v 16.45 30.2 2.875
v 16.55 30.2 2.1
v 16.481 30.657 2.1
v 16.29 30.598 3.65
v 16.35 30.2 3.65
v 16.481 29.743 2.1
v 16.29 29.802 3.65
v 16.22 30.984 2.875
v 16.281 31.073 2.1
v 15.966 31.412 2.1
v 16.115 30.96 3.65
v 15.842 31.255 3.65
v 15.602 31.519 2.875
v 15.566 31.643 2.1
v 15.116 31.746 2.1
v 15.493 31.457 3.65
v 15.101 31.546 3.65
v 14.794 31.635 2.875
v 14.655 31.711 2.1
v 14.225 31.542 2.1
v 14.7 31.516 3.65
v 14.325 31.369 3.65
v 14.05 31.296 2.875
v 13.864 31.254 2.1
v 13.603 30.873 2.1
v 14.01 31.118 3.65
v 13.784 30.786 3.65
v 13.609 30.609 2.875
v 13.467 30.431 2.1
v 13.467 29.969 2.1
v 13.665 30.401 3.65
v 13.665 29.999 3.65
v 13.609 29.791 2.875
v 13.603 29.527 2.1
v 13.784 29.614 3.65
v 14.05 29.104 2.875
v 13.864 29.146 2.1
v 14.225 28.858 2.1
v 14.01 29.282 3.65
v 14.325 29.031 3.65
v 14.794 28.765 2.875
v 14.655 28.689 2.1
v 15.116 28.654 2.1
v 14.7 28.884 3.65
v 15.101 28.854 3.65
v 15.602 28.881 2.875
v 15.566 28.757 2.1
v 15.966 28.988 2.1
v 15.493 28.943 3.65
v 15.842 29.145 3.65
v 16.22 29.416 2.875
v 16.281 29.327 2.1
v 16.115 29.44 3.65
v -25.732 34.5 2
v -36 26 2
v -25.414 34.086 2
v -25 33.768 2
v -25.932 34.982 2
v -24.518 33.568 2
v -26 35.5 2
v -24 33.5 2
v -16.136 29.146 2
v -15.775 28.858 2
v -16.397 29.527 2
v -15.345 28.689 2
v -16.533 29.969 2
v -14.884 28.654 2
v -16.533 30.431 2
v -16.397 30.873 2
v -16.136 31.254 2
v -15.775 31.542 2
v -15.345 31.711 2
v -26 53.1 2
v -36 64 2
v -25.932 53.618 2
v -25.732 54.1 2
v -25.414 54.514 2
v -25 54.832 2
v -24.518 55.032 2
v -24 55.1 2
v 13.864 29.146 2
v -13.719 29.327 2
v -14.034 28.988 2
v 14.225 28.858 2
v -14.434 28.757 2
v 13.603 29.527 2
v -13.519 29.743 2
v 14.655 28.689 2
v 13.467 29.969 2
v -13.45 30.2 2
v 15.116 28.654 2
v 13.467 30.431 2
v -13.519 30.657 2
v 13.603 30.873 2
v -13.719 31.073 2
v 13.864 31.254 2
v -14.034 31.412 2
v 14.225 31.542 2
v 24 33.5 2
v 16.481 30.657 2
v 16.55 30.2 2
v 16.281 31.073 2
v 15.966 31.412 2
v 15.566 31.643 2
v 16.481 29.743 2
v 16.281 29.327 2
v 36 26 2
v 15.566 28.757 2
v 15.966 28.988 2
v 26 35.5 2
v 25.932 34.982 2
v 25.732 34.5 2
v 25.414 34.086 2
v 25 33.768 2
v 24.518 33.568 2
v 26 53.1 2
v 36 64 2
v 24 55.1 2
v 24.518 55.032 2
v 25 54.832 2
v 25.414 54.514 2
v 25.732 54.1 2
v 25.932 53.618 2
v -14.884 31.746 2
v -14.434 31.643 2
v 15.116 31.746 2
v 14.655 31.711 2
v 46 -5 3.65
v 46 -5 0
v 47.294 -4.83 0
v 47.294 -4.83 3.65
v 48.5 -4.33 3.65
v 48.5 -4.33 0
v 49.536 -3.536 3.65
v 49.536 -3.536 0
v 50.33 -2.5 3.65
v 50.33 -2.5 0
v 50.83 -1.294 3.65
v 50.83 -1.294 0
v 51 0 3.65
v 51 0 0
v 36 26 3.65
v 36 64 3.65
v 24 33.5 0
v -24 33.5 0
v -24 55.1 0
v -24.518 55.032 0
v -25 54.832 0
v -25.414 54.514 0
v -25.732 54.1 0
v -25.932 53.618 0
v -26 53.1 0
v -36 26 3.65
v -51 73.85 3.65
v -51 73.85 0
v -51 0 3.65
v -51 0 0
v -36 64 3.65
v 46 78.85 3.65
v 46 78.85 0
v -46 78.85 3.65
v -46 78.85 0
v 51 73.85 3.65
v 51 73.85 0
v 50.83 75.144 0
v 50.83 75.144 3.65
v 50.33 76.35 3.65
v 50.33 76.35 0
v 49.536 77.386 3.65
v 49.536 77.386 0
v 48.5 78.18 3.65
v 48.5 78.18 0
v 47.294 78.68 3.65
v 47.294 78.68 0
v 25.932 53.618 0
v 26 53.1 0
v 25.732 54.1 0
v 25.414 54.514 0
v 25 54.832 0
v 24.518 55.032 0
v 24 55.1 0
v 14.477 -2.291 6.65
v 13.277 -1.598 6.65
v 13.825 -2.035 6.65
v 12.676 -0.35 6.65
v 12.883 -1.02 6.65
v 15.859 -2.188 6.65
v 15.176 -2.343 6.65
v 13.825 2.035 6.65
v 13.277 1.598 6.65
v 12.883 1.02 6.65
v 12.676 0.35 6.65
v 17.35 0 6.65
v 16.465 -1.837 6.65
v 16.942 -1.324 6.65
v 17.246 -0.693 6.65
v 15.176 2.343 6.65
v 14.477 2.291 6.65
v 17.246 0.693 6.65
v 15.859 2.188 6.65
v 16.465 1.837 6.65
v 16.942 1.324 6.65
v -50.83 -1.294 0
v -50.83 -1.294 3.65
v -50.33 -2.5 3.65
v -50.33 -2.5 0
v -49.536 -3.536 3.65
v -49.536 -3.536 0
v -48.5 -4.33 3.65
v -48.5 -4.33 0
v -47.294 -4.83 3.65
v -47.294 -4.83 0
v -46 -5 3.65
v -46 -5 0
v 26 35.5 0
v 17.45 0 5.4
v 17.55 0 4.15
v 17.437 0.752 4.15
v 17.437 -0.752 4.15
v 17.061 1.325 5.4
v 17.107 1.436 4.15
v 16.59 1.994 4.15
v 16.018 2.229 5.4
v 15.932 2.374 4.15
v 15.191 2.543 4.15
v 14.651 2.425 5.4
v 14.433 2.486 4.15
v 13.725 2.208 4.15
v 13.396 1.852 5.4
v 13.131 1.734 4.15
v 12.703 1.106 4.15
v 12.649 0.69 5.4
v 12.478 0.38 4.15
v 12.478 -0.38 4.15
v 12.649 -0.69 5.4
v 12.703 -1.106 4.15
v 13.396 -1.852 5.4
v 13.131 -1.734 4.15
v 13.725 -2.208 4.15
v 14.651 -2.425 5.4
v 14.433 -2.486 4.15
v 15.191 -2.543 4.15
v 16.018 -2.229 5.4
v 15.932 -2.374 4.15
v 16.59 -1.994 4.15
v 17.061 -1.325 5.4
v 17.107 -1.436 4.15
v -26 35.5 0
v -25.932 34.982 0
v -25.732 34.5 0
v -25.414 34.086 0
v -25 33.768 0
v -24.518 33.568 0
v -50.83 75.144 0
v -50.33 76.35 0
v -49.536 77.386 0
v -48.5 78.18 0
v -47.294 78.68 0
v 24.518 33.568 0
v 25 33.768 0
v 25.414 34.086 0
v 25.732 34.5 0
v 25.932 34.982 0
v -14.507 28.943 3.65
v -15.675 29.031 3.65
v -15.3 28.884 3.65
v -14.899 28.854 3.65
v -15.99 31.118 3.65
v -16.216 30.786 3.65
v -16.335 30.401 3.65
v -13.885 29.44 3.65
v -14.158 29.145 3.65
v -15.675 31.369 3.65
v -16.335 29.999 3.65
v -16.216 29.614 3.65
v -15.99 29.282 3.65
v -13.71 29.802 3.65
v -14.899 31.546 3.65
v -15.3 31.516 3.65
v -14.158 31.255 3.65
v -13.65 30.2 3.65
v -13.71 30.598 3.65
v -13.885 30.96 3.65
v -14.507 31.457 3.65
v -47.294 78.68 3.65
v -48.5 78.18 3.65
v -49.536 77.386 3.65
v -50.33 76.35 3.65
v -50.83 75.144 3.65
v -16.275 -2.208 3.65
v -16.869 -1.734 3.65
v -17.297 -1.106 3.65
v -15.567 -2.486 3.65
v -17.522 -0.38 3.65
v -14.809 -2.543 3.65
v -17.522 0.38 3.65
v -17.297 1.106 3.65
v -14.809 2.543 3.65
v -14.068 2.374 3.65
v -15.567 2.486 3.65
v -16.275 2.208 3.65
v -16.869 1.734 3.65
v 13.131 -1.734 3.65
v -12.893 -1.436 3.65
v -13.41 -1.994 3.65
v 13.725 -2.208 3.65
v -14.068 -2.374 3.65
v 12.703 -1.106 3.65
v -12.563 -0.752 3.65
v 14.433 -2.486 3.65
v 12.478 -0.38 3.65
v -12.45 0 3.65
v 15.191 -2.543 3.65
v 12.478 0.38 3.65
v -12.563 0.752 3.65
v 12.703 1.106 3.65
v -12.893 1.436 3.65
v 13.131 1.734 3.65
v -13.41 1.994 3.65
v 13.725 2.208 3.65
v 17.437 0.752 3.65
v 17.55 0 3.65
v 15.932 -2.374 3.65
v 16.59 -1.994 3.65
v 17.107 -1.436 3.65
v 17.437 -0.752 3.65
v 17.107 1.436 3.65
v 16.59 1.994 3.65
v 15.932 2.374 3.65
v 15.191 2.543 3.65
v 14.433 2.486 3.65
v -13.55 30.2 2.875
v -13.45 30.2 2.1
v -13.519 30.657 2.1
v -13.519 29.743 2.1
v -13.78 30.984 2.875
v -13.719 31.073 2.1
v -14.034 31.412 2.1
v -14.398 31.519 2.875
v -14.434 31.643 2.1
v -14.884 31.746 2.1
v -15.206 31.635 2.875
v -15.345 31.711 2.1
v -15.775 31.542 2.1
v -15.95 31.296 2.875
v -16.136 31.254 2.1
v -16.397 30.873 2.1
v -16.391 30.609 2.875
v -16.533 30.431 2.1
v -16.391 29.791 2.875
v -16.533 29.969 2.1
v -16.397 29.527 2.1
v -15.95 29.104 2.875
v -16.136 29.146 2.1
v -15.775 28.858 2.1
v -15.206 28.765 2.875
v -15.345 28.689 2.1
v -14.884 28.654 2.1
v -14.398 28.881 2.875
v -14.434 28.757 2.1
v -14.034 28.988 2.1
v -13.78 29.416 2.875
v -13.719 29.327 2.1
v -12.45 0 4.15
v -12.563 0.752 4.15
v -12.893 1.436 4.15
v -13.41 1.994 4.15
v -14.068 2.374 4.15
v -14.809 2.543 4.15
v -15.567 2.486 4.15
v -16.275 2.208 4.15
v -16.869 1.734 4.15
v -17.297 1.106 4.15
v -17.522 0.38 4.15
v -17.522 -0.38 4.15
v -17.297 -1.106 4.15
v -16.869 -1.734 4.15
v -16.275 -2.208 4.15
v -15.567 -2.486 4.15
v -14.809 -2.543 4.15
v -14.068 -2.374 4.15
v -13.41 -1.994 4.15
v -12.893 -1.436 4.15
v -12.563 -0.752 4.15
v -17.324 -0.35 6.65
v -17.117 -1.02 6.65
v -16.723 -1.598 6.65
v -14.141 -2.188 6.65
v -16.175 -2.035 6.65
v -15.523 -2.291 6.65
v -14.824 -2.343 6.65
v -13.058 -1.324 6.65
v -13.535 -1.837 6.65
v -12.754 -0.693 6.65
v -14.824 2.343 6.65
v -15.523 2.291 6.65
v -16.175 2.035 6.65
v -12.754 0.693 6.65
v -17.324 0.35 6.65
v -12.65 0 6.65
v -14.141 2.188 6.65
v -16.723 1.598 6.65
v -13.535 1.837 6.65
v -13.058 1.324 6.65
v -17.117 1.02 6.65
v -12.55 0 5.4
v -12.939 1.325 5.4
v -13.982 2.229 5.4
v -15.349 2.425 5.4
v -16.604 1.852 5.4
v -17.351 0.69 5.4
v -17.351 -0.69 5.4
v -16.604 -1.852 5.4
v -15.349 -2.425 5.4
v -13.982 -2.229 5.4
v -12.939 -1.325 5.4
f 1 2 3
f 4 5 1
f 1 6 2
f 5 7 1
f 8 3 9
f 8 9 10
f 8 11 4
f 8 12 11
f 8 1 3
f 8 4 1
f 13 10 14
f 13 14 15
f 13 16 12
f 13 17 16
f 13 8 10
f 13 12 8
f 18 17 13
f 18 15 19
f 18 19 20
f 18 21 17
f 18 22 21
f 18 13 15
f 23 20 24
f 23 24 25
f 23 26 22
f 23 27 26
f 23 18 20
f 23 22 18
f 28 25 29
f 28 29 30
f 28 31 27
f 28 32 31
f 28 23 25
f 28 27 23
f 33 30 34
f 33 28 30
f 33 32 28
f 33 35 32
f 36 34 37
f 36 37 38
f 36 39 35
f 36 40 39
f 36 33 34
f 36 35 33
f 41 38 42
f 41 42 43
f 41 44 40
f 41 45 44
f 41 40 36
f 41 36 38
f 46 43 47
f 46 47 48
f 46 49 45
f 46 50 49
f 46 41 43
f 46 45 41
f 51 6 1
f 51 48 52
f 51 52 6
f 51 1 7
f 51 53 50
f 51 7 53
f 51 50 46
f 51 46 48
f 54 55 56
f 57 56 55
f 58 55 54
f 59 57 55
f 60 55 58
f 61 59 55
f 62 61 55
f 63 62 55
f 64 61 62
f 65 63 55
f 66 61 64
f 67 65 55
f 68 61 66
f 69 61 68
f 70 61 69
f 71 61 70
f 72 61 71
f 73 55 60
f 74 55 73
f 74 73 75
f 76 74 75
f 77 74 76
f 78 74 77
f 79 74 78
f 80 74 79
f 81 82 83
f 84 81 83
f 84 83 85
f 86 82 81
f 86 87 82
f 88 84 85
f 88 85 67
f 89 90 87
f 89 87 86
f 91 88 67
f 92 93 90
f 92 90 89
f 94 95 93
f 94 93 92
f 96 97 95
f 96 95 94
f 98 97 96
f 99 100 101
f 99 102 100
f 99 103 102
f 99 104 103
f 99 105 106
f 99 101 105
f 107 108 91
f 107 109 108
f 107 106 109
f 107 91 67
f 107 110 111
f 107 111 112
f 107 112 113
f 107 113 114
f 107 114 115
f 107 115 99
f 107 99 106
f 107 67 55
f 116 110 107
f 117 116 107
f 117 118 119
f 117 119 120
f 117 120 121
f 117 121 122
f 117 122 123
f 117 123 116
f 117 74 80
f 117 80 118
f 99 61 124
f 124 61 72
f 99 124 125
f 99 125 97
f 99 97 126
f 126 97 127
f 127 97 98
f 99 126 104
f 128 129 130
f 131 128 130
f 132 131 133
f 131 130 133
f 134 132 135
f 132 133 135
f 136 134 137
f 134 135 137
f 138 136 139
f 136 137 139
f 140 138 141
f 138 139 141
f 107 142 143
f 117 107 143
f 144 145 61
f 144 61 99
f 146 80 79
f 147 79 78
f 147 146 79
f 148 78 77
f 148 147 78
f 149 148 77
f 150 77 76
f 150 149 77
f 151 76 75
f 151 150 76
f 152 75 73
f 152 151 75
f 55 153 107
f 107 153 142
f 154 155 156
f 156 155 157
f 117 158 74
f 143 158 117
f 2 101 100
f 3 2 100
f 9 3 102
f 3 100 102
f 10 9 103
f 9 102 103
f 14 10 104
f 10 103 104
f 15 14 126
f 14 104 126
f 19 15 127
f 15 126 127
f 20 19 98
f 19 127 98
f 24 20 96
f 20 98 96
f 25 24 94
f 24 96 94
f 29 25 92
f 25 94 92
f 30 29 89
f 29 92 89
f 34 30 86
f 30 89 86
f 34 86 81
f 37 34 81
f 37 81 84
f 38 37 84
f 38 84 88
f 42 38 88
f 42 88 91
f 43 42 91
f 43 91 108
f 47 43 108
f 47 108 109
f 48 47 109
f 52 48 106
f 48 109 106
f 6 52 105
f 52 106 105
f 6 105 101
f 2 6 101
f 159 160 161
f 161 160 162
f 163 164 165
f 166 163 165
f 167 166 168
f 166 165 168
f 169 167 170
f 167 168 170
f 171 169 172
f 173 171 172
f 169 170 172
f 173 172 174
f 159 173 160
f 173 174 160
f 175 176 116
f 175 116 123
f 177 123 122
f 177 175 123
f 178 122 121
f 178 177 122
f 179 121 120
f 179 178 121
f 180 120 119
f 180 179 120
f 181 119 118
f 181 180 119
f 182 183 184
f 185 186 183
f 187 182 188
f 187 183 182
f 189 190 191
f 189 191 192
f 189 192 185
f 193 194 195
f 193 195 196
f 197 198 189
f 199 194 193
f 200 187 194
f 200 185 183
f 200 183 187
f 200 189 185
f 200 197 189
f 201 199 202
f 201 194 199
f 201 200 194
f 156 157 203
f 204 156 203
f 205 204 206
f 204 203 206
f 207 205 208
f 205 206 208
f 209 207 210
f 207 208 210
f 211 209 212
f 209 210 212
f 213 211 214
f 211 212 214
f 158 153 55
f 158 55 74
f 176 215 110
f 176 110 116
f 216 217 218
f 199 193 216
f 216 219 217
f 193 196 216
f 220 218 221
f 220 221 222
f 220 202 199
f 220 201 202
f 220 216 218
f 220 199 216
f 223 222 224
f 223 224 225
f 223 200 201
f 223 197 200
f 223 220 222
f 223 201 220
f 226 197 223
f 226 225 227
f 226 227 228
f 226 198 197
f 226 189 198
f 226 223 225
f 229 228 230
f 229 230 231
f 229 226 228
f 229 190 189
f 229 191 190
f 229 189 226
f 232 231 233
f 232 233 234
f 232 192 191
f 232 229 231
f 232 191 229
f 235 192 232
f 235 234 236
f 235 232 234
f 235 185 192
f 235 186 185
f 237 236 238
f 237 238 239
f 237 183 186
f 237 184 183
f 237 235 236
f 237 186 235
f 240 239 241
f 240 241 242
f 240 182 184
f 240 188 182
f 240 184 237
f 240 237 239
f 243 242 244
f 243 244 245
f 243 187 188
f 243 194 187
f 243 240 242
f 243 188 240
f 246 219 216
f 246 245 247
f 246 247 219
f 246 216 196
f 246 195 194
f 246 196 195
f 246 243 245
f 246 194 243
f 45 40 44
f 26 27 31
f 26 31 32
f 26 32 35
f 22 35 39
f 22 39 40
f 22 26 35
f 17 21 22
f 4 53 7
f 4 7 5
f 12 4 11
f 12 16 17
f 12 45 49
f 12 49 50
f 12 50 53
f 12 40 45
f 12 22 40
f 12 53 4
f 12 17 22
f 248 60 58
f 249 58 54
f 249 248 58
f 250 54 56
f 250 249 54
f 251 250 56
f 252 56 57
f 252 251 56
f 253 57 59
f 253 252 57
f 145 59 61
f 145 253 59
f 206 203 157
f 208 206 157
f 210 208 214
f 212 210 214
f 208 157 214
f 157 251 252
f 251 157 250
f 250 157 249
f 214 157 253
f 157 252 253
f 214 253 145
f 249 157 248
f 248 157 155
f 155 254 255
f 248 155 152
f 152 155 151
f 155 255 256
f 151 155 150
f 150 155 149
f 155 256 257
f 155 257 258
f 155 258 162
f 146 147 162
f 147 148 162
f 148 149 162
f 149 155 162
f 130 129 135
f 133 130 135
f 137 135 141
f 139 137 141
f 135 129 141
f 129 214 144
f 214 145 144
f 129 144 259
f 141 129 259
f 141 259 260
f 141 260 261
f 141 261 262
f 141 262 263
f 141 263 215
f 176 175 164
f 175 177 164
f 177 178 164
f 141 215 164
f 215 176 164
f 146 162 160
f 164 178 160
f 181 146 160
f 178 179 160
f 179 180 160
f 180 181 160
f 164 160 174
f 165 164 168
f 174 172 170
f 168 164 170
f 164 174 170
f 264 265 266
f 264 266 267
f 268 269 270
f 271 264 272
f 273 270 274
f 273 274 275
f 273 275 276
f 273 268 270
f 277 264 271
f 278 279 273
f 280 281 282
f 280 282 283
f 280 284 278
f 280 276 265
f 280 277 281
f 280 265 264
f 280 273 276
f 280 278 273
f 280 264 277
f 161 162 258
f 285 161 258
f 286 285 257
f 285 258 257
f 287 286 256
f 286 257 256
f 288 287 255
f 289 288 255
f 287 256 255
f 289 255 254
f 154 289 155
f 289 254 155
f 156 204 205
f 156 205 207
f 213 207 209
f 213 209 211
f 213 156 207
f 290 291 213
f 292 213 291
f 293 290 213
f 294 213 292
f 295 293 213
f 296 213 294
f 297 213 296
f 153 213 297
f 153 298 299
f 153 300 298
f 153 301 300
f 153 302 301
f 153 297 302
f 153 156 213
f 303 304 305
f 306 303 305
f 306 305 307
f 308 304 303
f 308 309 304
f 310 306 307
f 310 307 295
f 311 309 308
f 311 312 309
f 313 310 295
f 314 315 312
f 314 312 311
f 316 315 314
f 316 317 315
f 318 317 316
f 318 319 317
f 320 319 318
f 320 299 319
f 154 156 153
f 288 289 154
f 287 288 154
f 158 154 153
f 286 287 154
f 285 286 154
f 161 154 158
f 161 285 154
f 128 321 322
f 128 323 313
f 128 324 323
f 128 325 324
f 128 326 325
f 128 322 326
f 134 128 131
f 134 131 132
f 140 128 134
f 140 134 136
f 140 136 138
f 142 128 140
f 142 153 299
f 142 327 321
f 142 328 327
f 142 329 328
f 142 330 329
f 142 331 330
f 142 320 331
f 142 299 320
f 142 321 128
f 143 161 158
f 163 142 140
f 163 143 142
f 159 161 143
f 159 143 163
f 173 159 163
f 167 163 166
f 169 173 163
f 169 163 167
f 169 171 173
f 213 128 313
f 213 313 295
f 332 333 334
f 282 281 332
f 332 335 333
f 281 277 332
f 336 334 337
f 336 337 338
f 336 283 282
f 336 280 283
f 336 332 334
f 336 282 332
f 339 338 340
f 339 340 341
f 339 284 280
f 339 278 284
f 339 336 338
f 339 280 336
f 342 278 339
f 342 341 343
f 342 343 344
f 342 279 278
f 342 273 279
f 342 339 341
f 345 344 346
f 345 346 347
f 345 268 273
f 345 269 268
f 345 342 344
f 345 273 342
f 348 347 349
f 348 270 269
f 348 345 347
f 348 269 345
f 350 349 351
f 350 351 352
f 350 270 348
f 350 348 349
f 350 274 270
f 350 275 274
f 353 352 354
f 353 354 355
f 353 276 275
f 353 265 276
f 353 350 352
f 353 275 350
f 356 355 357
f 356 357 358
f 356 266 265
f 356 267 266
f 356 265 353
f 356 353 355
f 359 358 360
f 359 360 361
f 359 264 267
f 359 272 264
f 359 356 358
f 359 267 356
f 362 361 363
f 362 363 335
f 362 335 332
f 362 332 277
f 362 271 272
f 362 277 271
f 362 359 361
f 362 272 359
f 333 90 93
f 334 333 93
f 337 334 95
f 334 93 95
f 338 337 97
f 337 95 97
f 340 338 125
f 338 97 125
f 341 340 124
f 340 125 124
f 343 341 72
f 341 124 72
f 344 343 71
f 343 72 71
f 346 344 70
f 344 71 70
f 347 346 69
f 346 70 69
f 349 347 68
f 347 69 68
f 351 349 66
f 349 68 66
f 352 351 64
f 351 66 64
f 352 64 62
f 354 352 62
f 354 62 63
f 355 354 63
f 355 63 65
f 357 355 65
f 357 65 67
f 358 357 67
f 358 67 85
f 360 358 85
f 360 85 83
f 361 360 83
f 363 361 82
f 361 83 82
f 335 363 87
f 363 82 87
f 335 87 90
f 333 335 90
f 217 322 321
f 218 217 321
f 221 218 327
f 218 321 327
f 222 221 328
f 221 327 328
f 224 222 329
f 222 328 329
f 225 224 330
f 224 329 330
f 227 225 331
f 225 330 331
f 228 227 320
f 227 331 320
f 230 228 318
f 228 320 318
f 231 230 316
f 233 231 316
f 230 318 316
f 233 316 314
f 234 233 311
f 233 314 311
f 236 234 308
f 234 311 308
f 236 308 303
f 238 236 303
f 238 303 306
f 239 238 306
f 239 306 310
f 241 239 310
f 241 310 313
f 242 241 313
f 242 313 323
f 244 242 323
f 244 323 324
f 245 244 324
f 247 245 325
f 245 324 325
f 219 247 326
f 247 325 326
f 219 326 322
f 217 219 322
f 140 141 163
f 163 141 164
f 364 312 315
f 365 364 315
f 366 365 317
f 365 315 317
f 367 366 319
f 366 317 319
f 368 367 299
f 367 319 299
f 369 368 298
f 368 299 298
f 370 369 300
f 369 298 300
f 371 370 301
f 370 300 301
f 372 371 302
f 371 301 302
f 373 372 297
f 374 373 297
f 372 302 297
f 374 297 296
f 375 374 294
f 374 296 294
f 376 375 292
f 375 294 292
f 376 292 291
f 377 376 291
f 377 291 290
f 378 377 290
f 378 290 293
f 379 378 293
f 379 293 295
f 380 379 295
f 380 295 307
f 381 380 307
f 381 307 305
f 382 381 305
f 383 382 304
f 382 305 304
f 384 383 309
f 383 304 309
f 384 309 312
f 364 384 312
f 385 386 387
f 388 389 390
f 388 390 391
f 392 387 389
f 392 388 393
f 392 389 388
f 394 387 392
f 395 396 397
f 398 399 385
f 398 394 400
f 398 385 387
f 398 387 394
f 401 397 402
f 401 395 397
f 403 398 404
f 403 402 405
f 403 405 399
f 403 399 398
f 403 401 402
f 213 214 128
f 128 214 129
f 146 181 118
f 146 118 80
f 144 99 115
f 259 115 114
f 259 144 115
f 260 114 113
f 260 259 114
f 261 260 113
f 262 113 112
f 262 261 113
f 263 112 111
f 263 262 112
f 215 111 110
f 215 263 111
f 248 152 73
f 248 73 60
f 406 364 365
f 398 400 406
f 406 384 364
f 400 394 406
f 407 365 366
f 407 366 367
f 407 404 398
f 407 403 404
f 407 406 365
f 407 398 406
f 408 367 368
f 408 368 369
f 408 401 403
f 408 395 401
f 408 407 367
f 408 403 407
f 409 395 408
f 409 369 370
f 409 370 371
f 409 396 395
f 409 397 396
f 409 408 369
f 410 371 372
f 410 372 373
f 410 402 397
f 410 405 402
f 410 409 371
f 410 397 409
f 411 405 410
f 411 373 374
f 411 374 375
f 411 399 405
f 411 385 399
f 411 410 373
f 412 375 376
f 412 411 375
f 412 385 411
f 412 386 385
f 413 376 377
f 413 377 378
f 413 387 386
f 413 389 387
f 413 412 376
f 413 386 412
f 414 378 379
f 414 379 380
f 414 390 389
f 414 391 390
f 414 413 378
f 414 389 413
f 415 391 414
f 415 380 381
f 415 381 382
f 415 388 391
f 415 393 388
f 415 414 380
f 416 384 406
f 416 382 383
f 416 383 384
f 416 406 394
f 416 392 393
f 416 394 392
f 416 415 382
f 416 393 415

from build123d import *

# Parameters (mm, degrees)
PAD_DEPTH          = 3.65
SKETCH002_R        = 2.55
PAD002_DEPTH       = 3
SKETCH006_W        = 72
SKETCH006_H        = 38
POCKET001_DEPTH    = 1.65
SKETCH003_R        = 1.55
PAD003_DEPTH       = 1.65
CHAMFER_1_SIZE2    = 0.2
CHAMFER_1_SIZE     = 2.5
CHAMFER_2_SIZE2    = 0.2
CHAMFER_2_SIZE     = 2.5
CHAMFER001_1_SIZE2 = 0.2
CHAMFER001_1_SIZE  = 1.55
CHAMFER001_2_SIZE2 = 0.2
CHAMFER001_2_SIZE  = 1.55
POCKET_DEPTH       = 6.651


with BuildPart() as part:
    # Sketch001 → Pad (new body)
    with BuildSketch(Plane.XY):
        with BuildLine():
            Line((-51, 73.85), (-51, 0))
            ThreePointArc((-51, 0), (-49.535534, -3.535534), (-46, -5))
            Line((-46, -5), (46, -5))
            ThreePointArc((46, -5), (49.535534, -3.535534), (51, 0))
            Line((51, 0), (51, 73.85))
            ThreePointArc((51, 73.85), (49.535534, 77.385534), (46, 78.85))
            Line((46, 78.85), (-46, 78.85))
            ThreePointArc((-46, 78.85), (-49.535534, 77.385534), (-51, 73.85))
        make_face()
    extrude(amount=PAD_DEPTH)

    # Sketch002 → Pad002 (join)
    with BuildSketch(Plane.XY.offset(3.65)):
        with Locations((-15, 0)):
            Circle(SKETCH002_R)
        with Locations((15, 0)):
            Circle(SKETCH002_R)
    extrude(amount=PAD002_DEPTH)

    # Sketch006 → Pocket001 (cut)
    with BuildSketch(Plane.XY.offset(3.65)):
        with Locations((0, 45)):
            Rectangle(SKETCH006_W, SKETCH006_H)
    extrude(amount=-POCKET001_DEPTH, mode=Mode.SUBTRACT)

    # Sketch003 → Pad003 (join)
    with BuildSketch(Plane.XY.offset(2)):
        with Locations((-15, 30.2)):
            Circle(SKETCH003_R)
        with Locations((15, 30.2)):
            Circle(SKETCH003_R)
    extrude(amount=PAD003_DEPTH)

    # Chamfer 1
    chamfer_1_edges = [part.edges().sort_by_distance(p)[0] for p in [
        (-17.55, 0, 6.65),
    ]]
    chamfer_1_side = part.faces().sort_by_distance((-17.55, 0, 5.15))[0]
    chamfer(chamfer_1_edges, length=CHAMFER_1_SIZE, length2=CHAMFER_1_SIZE2, reference=chamfer_1_side)

    # Chamfer 2
    chamfer_2_edges = [part.edges().sort_by_distance(p)[0] for p in [
        (12.45, 0, 6.65),
    ]]
    chamfer_2_side = part.faces().sort_by_distance((12.45, 0, 5.15))[0]
    chamfer(chamfer_2_edges, length=CHAMFER_2_SIZE, length2=CHAMFER_2_SIZE2, reference=chamfer_2_side)

    # Chamfer001 1
    chamfer001_1_edges = [part.edges().sort_by_distance(p)[0] for p in [
        (-16.55, 30.2, 3.65),
    ]]
    chamfer001_1_side = part.faces().sort_by_distance((-16.55, 30.2, 2.825))[0]
    chamfer(chamfer001_1_edges, length=CHAMFER001_1_SIZE, length2=CHAMFER001_1_SIZE2, reference=chamfer001_1_side)

    # Chamfer001 2
    chamfer001_2_edges = [part.edges().sort_by_distance(p)[0] for p in [
        (13.45, 30.2, 3.65),
    ]]
    chamfer001_2_side = part.faces().sort_by_distance((13.45, 30.2, 2.825))[0]
    chamfer(chamfer001_2_edges, length=CHAMFER001_2_SIZE, length2=CHAMFER001_2_SIZE2, reference=chamfer001_2_side)

    # Sketch005 → Pocket (cut, through all)
    with BuildSketch(Plane.XY):
        with BuildLine():
            Line((-26, 53.1), (-26, 35.5))
            ThreePointArc((-26, 35.5), (-25.414214, 34.085786), (-24, 33.5))
            Line((-24, 33.5), (24, 33.5))
            ThreePointArc((24, 33.5), (25.414214, 34.085786), (26, 35.5))
            Line((26, 35.5), (26, 53.1))
            ThreePointArc((26, 53.1), (25.414214, 54.514214), (24, 55.1))
            Line((24, 55.1), (-24, 55.1))
            ThreePointArc((-24, 55.1), (-25.414214, 54.514214), (-26, 53.1))
        make_face()
    extrude(amount=POCKET_DEPTH, mode=Mode.SUBTRACT)


solid = part.part
